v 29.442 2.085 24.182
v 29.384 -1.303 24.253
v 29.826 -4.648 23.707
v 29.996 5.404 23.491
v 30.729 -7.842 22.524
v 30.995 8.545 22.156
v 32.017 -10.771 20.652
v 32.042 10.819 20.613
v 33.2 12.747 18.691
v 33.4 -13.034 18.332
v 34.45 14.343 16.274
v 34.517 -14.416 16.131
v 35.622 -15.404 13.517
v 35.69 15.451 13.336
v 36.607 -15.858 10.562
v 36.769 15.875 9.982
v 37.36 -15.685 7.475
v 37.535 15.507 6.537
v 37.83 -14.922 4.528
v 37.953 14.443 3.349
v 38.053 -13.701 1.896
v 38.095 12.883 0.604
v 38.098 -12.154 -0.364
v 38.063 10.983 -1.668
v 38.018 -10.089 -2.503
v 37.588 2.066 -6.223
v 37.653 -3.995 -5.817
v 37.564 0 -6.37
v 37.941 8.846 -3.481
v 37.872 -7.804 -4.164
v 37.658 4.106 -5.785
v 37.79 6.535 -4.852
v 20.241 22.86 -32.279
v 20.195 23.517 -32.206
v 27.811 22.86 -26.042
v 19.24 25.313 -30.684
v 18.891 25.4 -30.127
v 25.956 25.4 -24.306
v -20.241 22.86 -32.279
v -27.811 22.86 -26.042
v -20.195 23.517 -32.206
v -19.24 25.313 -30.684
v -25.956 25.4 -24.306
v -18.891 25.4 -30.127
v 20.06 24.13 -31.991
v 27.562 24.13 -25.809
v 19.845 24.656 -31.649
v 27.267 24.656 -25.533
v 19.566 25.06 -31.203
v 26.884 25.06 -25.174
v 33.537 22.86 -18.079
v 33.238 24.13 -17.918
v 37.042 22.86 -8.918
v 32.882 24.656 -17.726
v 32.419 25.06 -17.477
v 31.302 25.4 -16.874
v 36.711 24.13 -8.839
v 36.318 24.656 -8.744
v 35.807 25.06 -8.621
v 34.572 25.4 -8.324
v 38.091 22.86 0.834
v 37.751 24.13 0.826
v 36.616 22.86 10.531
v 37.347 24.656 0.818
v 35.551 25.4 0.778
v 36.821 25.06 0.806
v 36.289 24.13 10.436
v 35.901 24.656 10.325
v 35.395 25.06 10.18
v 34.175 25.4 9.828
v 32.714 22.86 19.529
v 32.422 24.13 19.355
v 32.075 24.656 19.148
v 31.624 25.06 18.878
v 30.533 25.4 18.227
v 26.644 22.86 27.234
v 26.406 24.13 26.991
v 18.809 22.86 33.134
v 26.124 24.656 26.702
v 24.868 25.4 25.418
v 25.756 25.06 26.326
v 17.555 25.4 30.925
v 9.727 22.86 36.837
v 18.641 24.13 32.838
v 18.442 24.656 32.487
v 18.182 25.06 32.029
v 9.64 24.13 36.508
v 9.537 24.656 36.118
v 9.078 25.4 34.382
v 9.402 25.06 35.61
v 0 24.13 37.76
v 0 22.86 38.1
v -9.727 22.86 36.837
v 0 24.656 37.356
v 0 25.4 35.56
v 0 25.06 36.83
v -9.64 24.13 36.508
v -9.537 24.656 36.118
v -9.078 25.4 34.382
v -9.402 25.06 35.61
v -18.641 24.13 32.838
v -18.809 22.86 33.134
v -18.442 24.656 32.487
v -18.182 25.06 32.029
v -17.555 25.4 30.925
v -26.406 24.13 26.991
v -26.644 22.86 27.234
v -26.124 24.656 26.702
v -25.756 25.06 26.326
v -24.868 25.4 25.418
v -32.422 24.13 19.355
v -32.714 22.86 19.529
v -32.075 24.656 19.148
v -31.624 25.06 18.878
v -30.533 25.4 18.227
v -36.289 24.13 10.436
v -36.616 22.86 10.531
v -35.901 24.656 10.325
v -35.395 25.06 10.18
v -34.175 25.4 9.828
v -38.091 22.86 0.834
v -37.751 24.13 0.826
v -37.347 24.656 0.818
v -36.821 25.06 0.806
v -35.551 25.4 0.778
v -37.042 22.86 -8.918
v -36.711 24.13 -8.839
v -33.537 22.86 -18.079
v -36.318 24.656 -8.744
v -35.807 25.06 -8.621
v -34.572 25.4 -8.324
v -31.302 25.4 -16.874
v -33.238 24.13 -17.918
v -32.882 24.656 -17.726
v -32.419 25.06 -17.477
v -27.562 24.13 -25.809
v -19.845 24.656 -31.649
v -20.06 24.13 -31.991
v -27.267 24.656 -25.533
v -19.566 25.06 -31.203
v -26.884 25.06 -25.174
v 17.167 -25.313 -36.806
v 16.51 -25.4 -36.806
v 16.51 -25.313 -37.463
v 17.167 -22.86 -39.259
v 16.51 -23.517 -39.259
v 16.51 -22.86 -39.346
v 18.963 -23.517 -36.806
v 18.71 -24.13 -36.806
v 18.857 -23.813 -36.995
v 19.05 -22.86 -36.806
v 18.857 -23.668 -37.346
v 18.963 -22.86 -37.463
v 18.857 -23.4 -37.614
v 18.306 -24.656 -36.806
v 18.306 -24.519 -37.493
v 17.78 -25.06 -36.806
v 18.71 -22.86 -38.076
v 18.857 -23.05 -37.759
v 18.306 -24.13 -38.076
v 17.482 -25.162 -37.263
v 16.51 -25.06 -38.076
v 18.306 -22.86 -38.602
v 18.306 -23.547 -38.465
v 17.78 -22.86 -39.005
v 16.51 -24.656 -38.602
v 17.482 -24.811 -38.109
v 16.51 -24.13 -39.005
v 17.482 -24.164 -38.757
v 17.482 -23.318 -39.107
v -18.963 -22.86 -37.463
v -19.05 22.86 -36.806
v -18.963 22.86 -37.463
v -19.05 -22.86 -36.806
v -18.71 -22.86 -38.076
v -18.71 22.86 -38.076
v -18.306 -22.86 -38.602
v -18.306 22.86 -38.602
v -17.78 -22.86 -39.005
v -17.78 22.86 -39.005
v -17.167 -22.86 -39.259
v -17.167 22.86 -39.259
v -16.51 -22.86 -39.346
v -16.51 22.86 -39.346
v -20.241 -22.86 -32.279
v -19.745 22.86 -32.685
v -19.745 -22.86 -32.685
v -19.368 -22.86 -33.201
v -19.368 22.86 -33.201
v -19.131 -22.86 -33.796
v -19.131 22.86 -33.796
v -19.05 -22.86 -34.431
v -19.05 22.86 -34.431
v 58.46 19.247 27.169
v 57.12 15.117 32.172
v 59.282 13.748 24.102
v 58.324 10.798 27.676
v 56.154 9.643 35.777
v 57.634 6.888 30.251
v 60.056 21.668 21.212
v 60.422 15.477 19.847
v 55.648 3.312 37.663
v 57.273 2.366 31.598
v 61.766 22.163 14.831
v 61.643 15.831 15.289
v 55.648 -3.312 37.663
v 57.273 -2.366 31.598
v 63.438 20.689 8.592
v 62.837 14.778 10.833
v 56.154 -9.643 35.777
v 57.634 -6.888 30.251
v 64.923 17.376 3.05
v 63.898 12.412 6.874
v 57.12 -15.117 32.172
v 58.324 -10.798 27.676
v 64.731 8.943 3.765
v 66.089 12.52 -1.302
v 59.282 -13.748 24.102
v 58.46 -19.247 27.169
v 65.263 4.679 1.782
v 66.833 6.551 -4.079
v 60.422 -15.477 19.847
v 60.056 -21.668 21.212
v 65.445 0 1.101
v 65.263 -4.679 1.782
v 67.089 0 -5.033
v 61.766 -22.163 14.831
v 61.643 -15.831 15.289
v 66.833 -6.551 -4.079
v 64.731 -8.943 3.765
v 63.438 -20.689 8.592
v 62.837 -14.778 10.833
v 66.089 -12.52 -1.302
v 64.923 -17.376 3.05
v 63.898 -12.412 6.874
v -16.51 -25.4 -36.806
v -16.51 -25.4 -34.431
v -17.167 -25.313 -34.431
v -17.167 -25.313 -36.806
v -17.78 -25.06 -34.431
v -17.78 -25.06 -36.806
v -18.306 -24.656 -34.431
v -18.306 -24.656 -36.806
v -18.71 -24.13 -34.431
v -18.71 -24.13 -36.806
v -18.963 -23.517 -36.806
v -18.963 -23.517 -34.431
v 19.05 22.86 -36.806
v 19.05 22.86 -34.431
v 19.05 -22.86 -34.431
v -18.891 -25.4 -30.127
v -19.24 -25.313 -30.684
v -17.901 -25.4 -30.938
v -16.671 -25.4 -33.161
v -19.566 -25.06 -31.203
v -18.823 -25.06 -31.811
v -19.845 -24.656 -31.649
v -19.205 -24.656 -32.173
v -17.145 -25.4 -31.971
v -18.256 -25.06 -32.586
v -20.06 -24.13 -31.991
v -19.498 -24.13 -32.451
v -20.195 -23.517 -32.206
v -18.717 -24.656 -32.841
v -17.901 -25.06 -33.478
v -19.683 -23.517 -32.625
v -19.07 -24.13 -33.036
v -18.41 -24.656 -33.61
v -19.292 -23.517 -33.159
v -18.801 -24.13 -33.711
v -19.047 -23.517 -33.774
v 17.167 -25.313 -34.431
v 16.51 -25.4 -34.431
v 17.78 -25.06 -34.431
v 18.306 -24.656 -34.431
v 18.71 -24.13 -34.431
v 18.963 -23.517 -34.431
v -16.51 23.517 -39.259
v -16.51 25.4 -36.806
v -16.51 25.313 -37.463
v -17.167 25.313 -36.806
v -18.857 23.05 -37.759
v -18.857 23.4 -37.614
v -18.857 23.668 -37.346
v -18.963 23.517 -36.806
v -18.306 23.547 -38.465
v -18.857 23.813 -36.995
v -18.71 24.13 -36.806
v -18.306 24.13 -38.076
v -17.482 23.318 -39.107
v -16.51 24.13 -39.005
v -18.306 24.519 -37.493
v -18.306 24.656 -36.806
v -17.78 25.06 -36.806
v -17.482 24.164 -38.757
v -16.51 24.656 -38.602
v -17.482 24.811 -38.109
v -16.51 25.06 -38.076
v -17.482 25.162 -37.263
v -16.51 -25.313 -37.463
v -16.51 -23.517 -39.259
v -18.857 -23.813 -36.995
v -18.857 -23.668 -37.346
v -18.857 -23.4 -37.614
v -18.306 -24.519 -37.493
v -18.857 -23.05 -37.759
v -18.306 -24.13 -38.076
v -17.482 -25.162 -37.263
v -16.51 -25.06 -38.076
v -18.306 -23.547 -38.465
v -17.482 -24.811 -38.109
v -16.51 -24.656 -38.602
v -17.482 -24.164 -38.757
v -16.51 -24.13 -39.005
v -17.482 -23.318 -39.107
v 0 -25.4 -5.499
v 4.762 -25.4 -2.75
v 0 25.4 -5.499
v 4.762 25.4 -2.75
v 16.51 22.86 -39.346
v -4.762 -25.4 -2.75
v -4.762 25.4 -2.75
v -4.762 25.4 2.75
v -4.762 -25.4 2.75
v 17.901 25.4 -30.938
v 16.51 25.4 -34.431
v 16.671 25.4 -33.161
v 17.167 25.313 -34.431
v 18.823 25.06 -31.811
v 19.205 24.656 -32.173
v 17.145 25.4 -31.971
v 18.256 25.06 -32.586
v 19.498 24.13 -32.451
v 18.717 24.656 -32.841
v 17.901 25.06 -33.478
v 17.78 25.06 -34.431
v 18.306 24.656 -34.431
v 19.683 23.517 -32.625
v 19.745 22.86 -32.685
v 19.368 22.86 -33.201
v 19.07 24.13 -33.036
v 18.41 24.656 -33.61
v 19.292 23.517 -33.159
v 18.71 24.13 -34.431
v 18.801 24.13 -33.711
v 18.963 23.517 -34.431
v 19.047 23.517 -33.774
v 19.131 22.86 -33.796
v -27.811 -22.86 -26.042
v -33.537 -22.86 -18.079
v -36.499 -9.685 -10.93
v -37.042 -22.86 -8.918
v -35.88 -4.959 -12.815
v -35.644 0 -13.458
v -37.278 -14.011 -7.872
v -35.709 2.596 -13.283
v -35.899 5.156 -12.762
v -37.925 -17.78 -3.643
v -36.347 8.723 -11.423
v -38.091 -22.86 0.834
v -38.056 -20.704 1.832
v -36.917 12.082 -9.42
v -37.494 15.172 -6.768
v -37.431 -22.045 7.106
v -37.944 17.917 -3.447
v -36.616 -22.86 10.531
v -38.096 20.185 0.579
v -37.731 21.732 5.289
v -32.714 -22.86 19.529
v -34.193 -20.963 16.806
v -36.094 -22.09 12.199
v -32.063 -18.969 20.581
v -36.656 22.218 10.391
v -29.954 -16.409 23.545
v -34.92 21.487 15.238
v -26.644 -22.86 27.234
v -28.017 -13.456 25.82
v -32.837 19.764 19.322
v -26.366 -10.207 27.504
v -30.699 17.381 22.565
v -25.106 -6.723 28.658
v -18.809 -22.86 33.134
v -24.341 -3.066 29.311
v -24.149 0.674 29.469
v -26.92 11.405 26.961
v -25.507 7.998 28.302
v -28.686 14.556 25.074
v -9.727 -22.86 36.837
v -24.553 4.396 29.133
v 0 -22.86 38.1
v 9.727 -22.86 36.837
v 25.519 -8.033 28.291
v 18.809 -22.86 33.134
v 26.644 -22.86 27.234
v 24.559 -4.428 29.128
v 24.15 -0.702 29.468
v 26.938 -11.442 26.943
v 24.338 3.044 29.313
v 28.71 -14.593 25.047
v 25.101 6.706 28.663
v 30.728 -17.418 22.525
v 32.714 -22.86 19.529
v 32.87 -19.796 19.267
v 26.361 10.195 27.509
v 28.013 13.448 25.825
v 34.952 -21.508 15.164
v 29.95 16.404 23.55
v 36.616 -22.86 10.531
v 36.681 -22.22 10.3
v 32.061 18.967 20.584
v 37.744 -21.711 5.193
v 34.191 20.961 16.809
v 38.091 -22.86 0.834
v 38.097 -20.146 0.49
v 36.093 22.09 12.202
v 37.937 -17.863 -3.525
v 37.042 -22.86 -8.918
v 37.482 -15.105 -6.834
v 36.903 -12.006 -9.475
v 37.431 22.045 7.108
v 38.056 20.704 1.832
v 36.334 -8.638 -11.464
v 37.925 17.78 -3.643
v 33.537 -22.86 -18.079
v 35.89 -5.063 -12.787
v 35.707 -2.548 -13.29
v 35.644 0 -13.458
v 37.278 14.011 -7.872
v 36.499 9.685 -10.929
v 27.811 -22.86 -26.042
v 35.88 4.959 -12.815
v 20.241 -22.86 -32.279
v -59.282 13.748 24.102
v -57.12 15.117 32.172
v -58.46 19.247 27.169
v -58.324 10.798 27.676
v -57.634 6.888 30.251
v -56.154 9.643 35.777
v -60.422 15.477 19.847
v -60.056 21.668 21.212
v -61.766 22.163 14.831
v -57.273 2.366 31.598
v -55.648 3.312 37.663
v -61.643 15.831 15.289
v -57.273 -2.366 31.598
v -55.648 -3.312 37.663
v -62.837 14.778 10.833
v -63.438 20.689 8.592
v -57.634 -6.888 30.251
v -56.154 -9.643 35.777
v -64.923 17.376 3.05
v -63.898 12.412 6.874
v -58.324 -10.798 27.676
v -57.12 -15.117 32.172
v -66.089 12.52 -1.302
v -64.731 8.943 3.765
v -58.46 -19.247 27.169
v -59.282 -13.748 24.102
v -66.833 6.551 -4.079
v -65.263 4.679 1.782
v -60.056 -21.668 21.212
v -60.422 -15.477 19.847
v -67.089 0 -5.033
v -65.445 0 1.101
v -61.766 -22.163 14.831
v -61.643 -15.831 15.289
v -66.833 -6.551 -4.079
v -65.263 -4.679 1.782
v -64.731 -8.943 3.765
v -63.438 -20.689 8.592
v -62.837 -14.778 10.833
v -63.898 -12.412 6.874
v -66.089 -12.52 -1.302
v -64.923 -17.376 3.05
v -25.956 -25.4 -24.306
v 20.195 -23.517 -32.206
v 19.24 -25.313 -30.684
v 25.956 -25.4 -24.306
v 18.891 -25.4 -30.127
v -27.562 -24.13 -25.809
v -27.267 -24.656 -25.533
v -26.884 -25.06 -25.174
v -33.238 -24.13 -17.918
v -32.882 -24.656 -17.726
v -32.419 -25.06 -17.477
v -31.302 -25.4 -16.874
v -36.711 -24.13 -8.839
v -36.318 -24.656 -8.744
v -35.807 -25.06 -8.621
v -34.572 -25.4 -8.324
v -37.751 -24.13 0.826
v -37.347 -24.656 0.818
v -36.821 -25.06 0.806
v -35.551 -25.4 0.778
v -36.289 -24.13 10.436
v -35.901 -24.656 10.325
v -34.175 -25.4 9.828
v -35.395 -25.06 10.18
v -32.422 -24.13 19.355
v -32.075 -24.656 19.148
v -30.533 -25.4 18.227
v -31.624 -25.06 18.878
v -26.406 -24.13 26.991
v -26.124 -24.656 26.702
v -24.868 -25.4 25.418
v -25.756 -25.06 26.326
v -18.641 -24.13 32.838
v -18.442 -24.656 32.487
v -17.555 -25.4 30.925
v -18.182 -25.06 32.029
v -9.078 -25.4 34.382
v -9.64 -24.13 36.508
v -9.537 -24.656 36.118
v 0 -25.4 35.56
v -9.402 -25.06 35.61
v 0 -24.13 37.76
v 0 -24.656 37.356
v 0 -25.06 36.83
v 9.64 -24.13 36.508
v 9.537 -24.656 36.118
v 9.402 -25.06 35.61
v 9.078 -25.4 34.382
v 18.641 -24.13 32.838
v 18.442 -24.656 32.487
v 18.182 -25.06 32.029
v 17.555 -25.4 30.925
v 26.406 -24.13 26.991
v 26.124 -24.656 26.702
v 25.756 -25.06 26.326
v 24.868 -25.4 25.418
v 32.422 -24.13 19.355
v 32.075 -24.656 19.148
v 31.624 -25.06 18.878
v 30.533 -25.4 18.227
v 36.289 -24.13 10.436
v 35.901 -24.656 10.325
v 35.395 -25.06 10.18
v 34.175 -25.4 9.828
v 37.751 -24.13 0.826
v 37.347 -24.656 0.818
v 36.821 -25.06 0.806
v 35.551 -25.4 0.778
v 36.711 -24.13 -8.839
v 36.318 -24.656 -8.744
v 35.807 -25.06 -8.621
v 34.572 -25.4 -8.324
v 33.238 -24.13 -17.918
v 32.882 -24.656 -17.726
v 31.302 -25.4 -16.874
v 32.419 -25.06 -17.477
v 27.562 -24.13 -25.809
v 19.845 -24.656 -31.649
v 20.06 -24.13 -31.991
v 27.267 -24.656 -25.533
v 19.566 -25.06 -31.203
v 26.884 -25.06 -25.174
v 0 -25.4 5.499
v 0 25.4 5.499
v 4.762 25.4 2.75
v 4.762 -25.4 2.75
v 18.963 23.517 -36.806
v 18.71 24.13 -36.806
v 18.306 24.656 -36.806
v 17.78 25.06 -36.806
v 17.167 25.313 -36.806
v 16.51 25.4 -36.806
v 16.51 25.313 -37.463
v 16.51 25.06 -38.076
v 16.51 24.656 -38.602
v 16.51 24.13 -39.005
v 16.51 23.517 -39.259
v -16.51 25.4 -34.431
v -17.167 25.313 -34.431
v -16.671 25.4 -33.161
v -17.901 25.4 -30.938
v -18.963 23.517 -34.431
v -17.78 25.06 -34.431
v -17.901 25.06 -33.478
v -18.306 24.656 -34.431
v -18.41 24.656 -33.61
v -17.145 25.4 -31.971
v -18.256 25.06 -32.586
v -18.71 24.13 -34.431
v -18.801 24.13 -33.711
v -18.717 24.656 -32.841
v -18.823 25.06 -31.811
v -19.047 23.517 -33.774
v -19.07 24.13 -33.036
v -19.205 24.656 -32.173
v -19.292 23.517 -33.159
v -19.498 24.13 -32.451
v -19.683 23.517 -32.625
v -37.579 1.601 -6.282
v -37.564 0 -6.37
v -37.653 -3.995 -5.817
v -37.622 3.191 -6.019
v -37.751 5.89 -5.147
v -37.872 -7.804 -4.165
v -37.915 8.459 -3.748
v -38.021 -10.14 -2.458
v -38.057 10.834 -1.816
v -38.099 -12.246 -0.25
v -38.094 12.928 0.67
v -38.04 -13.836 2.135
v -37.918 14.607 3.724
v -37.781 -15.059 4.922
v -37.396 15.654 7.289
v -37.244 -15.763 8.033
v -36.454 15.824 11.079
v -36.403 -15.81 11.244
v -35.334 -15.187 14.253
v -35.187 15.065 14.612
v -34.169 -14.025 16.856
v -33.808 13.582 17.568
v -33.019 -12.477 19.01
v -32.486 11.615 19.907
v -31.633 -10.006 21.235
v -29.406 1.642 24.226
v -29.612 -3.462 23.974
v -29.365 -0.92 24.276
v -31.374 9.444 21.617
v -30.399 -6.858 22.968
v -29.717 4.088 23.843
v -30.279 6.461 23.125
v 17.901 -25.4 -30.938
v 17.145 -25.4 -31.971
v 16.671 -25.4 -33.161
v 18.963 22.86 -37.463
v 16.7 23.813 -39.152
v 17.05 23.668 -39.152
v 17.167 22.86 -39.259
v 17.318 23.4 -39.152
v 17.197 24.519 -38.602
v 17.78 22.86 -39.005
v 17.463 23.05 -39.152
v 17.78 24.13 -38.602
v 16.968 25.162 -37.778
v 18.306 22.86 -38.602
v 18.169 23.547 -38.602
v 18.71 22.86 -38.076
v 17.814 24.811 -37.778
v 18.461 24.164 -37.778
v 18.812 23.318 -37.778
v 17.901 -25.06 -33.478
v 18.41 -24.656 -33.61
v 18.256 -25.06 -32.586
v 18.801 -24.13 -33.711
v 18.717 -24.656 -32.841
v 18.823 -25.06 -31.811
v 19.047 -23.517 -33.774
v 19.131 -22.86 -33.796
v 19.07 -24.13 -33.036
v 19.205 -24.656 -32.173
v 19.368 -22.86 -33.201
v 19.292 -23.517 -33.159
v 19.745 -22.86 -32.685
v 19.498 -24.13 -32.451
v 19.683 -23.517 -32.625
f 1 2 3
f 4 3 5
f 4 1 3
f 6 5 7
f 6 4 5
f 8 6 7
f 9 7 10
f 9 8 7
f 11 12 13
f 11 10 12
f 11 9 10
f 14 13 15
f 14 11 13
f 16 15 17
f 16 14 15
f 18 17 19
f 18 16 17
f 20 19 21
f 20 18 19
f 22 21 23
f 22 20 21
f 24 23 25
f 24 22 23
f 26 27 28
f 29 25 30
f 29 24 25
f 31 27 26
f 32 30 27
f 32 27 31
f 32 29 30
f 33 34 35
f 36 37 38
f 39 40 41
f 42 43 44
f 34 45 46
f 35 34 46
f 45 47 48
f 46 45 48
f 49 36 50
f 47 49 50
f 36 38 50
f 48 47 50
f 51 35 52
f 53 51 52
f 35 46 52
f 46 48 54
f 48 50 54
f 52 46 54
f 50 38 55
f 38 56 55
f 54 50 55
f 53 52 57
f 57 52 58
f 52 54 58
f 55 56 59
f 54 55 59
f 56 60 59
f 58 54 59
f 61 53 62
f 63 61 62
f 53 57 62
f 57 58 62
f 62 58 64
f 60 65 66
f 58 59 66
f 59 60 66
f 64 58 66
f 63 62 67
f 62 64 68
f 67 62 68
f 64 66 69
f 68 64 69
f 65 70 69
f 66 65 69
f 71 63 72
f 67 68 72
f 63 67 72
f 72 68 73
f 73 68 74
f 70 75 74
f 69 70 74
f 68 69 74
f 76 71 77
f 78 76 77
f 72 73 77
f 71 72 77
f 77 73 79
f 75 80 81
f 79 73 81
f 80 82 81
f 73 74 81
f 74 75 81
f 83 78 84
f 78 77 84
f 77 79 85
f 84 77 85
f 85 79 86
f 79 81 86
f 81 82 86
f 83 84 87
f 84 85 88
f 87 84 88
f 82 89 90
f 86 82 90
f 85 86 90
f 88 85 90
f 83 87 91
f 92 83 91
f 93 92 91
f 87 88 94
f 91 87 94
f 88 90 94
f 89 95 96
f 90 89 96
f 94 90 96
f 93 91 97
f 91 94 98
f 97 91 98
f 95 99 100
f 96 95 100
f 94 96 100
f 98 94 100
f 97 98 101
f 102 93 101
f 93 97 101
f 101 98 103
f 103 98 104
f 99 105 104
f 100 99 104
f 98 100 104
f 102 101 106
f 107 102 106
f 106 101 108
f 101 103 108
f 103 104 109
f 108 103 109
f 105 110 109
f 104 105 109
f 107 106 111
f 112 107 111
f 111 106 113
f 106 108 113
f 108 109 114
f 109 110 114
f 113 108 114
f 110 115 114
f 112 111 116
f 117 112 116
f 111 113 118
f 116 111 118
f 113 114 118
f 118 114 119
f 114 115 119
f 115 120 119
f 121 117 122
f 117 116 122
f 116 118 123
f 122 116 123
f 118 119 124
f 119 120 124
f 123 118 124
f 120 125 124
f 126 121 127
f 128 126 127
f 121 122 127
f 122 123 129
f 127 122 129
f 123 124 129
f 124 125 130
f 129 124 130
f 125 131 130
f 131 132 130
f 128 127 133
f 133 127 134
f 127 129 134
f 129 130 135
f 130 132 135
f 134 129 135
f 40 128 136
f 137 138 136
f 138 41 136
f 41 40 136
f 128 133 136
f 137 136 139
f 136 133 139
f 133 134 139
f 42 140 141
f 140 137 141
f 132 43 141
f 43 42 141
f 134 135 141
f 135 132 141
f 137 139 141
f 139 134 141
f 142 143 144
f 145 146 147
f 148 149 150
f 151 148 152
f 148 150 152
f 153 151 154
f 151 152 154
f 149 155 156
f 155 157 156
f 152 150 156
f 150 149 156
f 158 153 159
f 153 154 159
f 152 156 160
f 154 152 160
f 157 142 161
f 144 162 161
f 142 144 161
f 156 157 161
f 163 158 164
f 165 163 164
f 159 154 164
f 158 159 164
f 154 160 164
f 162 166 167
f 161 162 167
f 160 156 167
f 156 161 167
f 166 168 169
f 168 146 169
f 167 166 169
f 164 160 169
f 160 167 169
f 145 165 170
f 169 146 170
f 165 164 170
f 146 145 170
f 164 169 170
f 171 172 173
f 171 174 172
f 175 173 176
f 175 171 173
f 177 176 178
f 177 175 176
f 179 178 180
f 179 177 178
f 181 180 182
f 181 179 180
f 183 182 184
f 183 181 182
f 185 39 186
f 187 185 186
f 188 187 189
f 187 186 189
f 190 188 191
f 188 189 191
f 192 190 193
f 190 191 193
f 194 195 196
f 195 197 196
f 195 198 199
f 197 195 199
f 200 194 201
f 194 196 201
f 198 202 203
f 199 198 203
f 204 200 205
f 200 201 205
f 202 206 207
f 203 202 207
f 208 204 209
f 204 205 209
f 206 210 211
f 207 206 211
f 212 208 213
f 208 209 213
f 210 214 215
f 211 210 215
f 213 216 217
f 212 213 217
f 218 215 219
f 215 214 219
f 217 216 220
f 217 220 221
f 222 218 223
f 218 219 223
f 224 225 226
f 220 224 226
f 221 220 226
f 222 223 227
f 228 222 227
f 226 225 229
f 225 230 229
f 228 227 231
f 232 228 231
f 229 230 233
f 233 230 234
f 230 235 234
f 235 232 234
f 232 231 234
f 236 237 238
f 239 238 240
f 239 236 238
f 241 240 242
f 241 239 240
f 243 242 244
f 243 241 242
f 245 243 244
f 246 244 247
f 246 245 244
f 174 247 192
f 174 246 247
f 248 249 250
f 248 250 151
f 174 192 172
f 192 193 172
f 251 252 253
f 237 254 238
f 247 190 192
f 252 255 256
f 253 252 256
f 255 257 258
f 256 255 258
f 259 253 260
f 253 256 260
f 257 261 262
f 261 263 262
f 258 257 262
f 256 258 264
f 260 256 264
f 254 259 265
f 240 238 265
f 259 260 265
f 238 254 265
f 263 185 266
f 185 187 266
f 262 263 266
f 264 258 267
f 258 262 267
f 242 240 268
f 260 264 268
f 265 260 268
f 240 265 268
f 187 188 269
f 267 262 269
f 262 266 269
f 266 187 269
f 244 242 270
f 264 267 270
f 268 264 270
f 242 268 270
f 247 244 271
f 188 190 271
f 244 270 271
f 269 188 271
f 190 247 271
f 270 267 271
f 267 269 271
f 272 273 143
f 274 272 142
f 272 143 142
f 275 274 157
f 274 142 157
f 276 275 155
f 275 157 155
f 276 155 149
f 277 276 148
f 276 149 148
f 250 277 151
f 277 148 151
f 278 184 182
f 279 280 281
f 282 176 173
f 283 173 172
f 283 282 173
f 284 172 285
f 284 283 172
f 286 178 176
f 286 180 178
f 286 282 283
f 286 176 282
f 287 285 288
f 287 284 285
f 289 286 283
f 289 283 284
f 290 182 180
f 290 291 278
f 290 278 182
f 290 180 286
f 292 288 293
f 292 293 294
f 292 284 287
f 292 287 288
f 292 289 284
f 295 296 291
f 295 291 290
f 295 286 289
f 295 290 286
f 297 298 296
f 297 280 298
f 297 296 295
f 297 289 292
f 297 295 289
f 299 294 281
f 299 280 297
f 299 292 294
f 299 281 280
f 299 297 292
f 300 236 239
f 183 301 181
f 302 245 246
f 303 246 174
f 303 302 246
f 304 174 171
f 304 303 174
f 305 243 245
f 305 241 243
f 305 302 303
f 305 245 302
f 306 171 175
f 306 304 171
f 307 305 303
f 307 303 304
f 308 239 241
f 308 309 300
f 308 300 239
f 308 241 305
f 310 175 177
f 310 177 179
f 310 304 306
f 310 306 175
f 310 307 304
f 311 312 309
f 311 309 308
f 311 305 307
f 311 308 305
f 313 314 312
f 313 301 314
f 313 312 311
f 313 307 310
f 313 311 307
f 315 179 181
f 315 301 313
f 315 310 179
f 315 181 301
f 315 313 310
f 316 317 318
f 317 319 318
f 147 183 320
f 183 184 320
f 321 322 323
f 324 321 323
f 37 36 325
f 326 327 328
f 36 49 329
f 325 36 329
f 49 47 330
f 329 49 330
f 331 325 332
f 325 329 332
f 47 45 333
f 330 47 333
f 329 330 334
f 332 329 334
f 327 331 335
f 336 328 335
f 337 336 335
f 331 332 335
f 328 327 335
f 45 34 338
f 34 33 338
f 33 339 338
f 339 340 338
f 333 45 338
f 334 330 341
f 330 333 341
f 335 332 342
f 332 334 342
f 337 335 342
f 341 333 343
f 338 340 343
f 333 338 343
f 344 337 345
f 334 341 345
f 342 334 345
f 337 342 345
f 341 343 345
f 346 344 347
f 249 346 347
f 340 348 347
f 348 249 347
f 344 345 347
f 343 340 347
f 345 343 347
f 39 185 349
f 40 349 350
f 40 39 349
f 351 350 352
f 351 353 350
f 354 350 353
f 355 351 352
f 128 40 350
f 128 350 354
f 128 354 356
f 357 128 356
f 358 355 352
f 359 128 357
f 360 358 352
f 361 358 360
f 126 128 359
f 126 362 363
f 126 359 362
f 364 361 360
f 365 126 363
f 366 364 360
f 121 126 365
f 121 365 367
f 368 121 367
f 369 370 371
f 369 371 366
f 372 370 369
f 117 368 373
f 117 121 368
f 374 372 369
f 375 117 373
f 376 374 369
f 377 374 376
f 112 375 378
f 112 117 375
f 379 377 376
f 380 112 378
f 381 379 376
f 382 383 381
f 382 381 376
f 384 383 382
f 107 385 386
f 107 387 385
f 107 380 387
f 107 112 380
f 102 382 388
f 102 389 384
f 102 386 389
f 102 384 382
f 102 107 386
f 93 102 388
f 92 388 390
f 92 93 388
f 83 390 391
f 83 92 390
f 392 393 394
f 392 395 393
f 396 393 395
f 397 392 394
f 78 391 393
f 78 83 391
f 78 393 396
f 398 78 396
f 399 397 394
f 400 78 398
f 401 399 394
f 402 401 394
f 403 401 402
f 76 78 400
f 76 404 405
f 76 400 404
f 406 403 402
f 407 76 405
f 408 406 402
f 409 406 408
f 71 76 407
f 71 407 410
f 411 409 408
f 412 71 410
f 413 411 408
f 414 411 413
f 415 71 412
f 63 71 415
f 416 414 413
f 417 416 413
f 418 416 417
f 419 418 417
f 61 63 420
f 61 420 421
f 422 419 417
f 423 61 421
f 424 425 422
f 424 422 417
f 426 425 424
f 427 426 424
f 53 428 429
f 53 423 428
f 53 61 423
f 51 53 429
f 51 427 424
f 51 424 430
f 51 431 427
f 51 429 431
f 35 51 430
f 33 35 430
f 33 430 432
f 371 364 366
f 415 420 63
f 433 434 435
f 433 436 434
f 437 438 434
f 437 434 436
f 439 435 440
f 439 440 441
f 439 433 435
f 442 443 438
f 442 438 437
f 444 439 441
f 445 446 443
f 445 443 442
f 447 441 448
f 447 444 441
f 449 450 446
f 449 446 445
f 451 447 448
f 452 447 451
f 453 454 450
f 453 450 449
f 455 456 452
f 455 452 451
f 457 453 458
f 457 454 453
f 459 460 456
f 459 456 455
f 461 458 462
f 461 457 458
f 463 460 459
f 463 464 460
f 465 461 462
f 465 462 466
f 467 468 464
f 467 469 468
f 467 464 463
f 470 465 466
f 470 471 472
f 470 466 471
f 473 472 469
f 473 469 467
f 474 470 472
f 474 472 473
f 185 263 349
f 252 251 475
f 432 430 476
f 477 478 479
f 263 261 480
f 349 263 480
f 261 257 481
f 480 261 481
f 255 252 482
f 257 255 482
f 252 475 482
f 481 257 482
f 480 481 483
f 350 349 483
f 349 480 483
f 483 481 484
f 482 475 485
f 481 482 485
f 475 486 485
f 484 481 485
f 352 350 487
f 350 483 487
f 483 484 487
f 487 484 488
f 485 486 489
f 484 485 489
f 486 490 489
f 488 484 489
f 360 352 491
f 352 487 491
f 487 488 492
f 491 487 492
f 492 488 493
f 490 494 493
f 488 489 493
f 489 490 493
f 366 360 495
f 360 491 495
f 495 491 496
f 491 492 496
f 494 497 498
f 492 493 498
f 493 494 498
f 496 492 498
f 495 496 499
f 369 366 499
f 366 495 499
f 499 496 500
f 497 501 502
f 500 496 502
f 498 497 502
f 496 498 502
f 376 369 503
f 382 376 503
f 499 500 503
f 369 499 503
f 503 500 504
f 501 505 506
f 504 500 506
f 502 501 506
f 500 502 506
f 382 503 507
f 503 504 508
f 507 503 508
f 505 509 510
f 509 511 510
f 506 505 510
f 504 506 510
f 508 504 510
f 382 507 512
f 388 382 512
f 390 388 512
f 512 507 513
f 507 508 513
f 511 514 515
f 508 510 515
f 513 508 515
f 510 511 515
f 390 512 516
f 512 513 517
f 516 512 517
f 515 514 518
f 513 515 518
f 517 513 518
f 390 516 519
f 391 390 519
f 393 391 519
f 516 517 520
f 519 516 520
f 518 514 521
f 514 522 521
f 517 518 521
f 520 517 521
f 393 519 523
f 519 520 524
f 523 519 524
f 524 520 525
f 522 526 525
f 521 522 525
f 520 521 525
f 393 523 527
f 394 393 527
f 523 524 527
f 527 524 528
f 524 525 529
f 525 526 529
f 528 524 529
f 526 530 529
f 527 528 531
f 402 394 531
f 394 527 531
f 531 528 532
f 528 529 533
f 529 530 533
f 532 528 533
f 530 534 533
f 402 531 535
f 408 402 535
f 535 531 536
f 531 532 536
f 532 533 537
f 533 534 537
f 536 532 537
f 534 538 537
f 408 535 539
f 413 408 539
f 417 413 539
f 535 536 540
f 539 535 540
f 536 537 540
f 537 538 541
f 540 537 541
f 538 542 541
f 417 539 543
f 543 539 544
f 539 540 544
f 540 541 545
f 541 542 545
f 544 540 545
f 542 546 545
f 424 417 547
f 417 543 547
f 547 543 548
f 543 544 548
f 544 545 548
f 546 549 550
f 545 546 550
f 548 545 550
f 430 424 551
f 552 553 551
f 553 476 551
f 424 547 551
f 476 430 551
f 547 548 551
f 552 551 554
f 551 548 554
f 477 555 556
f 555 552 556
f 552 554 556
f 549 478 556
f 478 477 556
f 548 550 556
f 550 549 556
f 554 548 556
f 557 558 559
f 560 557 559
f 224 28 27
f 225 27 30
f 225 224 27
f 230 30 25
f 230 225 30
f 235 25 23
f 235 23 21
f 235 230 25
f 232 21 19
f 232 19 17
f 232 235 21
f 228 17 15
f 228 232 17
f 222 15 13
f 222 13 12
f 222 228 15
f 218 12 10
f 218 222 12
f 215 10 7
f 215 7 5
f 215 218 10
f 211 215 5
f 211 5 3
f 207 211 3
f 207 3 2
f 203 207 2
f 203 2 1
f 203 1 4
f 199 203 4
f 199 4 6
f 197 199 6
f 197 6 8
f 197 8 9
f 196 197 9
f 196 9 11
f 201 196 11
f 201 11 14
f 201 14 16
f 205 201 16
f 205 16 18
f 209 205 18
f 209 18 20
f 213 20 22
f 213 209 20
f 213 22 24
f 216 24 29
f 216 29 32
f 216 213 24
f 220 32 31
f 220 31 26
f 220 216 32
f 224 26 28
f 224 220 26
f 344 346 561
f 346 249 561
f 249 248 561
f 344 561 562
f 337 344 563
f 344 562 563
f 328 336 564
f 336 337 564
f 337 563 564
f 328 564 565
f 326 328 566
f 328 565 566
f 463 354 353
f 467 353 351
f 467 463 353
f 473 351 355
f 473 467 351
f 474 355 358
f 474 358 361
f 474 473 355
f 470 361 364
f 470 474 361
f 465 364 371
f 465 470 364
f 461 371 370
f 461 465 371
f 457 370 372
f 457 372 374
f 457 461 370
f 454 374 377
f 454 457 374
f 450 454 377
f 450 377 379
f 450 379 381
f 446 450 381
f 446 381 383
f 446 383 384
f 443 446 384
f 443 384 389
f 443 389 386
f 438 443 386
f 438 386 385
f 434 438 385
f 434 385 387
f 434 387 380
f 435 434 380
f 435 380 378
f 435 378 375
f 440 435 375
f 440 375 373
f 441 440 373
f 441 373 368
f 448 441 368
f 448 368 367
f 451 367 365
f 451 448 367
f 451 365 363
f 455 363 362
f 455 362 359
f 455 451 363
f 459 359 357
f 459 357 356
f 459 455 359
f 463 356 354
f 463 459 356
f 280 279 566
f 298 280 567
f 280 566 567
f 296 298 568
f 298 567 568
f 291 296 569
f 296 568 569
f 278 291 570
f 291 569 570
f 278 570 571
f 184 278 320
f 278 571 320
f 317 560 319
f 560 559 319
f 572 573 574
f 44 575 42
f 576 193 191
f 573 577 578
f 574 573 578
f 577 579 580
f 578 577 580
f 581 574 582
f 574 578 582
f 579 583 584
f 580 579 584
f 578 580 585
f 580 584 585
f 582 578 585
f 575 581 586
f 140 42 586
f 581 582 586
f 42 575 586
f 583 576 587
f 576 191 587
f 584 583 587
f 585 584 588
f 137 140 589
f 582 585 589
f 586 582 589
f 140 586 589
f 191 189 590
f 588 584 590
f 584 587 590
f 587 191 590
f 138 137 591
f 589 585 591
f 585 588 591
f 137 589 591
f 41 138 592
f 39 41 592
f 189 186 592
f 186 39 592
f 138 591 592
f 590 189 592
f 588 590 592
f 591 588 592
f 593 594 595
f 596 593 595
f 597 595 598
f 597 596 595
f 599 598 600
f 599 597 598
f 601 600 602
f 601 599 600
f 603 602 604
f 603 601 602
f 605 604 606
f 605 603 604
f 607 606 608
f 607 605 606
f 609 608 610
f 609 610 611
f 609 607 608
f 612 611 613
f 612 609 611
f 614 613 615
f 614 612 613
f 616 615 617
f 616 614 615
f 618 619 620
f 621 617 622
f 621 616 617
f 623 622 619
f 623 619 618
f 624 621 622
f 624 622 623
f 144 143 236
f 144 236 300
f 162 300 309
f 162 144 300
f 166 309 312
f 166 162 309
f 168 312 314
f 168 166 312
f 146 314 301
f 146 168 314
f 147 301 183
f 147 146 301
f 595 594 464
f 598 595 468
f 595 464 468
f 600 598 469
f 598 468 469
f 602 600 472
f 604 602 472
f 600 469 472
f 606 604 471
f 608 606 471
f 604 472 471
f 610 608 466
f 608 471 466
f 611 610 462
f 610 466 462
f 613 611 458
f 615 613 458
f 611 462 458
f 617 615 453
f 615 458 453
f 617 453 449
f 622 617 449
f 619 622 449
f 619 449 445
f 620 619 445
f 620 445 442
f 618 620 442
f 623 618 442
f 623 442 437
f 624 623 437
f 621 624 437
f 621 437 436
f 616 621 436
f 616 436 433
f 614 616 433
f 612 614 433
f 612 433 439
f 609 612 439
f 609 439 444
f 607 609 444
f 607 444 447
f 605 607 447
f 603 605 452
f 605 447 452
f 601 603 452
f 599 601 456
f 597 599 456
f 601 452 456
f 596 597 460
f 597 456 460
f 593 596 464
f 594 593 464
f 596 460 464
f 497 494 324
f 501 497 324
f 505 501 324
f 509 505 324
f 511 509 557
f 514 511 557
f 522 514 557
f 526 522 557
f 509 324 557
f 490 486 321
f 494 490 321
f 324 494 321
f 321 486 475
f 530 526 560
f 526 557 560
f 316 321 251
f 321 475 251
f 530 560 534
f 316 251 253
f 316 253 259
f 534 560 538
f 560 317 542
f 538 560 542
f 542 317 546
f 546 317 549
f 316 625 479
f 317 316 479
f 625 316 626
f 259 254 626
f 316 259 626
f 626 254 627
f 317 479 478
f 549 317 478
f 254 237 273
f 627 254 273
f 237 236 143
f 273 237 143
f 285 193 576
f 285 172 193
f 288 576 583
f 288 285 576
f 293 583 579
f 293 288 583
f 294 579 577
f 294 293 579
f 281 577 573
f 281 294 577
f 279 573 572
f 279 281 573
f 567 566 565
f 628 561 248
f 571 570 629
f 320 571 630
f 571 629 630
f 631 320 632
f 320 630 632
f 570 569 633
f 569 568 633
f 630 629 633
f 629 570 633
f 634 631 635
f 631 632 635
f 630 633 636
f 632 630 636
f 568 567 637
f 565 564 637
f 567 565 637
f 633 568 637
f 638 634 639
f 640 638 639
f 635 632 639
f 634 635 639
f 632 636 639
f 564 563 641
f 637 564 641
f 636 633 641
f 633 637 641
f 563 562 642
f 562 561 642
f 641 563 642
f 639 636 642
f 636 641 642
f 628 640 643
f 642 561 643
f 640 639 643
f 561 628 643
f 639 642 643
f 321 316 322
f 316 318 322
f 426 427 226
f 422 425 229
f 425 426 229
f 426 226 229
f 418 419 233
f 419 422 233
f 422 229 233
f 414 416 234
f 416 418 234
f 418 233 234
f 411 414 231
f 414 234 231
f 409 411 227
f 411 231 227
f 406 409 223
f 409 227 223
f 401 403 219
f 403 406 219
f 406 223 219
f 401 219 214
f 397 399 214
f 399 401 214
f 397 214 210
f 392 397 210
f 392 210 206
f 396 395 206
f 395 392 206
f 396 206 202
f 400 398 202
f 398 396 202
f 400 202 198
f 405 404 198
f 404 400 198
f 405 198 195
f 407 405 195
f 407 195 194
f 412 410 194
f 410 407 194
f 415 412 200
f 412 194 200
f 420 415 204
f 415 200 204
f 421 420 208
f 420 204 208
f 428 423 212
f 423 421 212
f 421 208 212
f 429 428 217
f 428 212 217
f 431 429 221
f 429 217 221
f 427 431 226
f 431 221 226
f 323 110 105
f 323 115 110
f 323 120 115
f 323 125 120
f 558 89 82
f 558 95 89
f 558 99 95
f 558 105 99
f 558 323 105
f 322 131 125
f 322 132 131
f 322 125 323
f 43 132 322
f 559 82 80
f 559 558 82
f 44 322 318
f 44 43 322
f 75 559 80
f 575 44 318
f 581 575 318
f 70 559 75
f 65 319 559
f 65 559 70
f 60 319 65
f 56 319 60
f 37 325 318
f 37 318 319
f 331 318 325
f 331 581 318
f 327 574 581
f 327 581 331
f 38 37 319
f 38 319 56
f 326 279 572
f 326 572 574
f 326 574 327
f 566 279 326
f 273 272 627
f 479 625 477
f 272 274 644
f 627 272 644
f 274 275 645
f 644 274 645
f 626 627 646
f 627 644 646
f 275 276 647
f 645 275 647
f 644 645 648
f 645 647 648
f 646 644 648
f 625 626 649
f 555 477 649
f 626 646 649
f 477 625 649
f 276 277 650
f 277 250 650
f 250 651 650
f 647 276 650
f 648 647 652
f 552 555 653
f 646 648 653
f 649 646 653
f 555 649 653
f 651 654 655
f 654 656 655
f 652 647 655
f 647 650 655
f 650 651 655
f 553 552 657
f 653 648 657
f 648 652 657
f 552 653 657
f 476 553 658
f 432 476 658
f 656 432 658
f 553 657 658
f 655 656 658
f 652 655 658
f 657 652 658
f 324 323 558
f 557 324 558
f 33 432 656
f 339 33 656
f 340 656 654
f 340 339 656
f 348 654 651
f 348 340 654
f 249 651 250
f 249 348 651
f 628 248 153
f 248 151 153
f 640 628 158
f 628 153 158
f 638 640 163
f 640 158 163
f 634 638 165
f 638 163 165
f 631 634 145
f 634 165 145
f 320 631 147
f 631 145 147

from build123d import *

# Parameters (mm, degrees)
SKETCH1_R           = 38.1
SKETCH1_W           = 38.1
SKETCH1_H           = 6.35
BOSS_EXTRUDE1_DEPTH = 25.4
BOSS_EXTRUDE2_START = -25.4
SKETCH3_R           = 22.225
SKETCH3_R_2         = 15.875
BOSS_EXTRUDE2_DEPTH = 33.655
FILLET1_R           = 2.54


with BuildPart() as part:
    # Sketch1 → Boss-Extrude1 (new, symmetric)
    # profile 1 of 2: a face of its own
    with BuildSketch(Plane(origin=(0, 0, 0), x_dir=(1, 0, 0), z_dir=(0, 1, 0))):
        Circle(SKETCH1_R)
        Polygon((0, -5.499261314), (4.7625, -2.749630657), (4.7625, 2.749630657), (0, 5.499261314), (-4.7625, 2.749630657), (-4.7625, -2.749630657), align=None, mode=Mode.SUBTRACT)
    # profile 2 of 2: a face of its own
    with BuildSketch(Plane(origin=(0, 0, 0), x_dir=(1, 0, 0), z_dir=(0, 1, 0))):
        with Locations((0, 36.170567884)):
            Rectangle(SKETCH1_W, SKETCH1_H)
    extrude(amount=BOSS_EXTRUDE1_DEPTH, both=True)

    # Sketch3 → Boss-Extrude2 (add)
    with BuildSketch(Plane(origin=(36.801773982, 0, 9.861005618), x_dir=(-0.2588190451025214, 0, 0.9659258262890681), z_dir=(-0.9659258262890681, 0, -0.2588190451025214)).offset(BOSS_EXTRUDE2_START)):
        with Locations(Location((0, 0, 0), (0, 0, 180))):
            Circle(SKETCH3_R)
        with Locations(Location((0, 0, 0), (0, 0, 180))):
            Circle(SKETCH3_R_2, mode=Mode.SUBTRACT)
    boss_extrude2 = extrude(amount=BOSS_EXTRUDE2_DEPTH)

    # Mirror1: Boss-Extrude2 across plane
    add(boss_extrude2.mirror(Plane(origin=(0, 0, 0), x_dir=(0, 0, 1), z_dir=(1, 0, 0))))

    # Fillet1
    fillet1_edges = [part.edges().sort_by_distance(p)[0] for p in [
        (19.05, 25.4, -36.170567884),
        (0, -25.4, -39.345567884),
        (19.05, -25.4, -36.170567884),
        (0, -25.4, 38.1),
        (-19.05, -25.4, -36.170567884),
        (0, 25.4, -39.345567884),
        (-19.05, 0, -39.345567884),
        (19.05, 0, -39.345567884),
        (19.05, 0, -32.995567884),
        (-19.05, 0, -32.995567884),
        (-19.05, 25.4, -36.170567884),
        (0, 25.4, 38.1),
    ]]
    fillet(fillet1_edges, radius=FILLET1_R)


solid = part.part
